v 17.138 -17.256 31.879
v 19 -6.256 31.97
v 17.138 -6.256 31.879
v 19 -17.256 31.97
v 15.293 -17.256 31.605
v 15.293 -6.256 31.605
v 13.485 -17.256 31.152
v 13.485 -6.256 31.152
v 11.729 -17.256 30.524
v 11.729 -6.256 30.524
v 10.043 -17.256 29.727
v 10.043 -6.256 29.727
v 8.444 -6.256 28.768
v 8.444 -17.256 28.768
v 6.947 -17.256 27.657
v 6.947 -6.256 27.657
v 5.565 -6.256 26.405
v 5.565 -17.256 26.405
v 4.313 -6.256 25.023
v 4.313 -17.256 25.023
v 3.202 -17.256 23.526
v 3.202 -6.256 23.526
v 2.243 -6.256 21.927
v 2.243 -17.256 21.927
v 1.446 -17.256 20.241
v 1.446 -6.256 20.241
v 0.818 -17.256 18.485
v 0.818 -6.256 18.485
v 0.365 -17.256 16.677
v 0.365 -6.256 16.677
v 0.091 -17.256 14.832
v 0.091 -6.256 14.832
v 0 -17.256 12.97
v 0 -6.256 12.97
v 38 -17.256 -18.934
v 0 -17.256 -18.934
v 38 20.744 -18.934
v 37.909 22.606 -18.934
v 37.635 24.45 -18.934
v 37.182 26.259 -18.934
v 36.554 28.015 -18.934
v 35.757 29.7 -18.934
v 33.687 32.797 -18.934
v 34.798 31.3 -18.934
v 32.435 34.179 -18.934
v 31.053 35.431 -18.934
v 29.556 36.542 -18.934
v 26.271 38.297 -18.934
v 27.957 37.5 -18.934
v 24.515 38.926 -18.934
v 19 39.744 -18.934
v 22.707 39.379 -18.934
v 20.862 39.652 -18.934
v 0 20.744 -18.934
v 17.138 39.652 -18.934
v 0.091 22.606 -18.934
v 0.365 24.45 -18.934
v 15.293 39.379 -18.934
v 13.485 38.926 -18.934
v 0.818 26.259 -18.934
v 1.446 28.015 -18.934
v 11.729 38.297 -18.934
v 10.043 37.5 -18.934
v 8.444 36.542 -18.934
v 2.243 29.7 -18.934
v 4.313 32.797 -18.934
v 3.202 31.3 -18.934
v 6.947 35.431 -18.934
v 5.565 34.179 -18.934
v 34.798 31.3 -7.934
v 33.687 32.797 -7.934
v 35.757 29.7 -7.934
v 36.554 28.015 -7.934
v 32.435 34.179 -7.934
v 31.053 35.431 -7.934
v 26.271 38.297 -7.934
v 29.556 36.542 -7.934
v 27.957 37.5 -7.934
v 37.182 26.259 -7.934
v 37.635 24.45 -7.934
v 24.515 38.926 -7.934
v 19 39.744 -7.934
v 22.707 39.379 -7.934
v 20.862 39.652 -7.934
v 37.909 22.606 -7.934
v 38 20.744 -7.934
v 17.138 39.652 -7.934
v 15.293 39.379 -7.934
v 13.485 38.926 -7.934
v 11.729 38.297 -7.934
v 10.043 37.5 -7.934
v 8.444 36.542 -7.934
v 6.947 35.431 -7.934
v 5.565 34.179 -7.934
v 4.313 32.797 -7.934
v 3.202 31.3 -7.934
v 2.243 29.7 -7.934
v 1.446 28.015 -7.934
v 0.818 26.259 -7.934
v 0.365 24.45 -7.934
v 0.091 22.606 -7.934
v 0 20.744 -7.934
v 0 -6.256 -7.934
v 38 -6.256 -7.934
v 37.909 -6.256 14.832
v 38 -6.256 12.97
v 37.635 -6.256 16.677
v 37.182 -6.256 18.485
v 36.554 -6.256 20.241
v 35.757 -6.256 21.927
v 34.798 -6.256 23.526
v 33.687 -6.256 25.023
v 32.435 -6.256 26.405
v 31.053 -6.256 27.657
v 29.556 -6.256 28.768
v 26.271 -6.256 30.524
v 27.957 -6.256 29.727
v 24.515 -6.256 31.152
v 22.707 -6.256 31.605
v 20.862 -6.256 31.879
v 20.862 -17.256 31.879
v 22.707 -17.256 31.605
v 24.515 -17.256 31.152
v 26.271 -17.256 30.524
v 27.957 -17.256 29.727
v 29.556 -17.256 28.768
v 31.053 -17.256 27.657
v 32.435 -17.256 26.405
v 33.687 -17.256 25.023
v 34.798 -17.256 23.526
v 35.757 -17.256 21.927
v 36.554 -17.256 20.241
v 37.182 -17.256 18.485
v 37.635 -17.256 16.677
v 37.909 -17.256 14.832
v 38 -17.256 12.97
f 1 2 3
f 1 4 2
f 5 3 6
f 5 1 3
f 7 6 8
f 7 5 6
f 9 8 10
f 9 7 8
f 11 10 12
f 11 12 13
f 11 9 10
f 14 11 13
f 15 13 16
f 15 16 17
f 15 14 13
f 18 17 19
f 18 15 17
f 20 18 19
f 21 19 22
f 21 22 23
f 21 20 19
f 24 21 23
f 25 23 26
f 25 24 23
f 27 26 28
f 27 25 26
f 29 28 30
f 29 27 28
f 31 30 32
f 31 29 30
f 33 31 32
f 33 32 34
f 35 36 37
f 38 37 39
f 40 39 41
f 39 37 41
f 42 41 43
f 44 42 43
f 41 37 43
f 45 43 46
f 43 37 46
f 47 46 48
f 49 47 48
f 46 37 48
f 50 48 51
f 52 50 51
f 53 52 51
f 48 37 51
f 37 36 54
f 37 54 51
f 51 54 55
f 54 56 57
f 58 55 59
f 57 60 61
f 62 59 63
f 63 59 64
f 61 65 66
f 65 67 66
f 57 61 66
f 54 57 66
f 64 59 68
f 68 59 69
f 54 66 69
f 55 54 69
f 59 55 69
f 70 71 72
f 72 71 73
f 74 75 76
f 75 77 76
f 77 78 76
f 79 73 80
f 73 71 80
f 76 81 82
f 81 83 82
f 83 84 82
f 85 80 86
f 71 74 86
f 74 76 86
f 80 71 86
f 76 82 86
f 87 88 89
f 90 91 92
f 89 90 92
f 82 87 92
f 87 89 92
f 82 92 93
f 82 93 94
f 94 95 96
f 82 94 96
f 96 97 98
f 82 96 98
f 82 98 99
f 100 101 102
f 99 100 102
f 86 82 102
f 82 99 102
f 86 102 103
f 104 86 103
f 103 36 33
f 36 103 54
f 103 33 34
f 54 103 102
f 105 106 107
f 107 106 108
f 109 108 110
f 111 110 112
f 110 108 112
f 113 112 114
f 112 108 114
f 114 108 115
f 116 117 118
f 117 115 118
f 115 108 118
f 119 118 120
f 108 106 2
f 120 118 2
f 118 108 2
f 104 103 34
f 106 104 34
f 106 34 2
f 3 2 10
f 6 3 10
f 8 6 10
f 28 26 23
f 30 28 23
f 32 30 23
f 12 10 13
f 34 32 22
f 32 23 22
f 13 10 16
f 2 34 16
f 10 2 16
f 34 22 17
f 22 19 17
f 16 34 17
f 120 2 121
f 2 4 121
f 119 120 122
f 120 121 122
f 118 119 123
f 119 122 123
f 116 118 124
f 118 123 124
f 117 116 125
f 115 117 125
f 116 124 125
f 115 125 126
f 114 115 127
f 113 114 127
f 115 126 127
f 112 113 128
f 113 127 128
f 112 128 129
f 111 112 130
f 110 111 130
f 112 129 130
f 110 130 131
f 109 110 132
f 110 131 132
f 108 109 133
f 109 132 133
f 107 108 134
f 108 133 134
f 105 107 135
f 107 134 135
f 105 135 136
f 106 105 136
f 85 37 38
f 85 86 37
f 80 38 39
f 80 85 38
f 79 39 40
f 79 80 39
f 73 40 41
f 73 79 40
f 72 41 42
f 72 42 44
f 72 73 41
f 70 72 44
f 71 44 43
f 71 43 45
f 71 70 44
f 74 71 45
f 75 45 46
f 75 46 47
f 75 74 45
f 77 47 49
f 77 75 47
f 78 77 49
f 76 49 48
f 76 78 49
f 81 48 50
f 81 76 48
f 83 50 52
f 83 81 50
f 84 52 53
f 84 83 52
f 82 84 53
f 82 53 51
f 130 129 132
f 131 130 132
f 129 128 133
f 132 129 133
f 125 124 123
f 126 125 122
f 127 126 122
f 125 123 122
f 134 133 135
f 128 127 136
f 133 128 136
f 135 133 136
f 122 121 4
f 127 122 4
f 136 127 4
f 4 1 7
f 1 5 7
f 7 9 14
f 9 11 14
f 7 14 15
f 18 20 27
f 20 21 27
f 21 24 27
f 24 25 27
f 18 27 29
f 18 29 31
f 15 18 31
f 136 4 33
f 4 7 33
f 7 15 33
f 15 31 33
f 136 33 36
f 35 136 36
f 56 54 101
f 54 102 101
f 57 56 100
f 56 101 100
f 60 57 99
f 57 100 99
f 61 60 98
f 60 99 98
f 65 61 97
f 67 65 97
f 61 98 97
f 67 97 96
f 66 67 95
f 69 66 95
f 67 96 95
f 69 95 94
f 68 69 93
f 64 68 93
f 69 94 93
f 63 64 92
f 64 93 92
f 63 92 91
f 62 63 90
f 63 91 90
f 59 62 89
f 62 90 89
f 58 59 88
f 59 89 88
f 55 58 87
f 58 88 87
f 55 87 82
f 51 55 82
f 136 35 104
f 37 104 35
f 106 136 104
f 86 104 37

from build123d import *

# Parameters (mm, degrees)
F1_DEPTH = 38
F2_R     = 18.99999
F3_R     = 18.99999


# Not quite as in the source:
# - a fillet or chamfer is up to 0.001 mm smaller than in the source, because OpenCascade refuses the exact size


with BuildPart() as f1:
    # F0 (on Right) → F1 (new body)
    with BuildSketch(Plane.YZ):
        Polygon((-6.256232895, 31.9699999726), (-17.256232895, 31.9699999726), (-17.256232895, -18.9337489045), (39.743767105, -18.9337489045), (39.743767105, -7.9337489045), (-6.256232895, -7.9337489045), align=None)
    extrude(amount=F1_DEPTH)

    # F2 (radius 19 in the source; OpenCascade refuses exactly that, so slightly less here)
    f2_edges = [f1.edges().sort_by_distance(p)[0] for p in [
        (38, -11.756233, 31.97),
        (0, -11.756233, 31.97),
    ]]
    fillet(f2_edges, radius=F2_R)

    # F3 (radius 19 in the source; OpenCascade refuses exactly that, so slightly less here)
    f3_edges = [f1.edges().sort_by_distance(p)[0] for p in [
        (38, 39.743767, -13.433749),
        (0, 39.743767, -13.433749),
    ]]
    fillet(f3_edges, radius=F3_R)


solid = f1.part
